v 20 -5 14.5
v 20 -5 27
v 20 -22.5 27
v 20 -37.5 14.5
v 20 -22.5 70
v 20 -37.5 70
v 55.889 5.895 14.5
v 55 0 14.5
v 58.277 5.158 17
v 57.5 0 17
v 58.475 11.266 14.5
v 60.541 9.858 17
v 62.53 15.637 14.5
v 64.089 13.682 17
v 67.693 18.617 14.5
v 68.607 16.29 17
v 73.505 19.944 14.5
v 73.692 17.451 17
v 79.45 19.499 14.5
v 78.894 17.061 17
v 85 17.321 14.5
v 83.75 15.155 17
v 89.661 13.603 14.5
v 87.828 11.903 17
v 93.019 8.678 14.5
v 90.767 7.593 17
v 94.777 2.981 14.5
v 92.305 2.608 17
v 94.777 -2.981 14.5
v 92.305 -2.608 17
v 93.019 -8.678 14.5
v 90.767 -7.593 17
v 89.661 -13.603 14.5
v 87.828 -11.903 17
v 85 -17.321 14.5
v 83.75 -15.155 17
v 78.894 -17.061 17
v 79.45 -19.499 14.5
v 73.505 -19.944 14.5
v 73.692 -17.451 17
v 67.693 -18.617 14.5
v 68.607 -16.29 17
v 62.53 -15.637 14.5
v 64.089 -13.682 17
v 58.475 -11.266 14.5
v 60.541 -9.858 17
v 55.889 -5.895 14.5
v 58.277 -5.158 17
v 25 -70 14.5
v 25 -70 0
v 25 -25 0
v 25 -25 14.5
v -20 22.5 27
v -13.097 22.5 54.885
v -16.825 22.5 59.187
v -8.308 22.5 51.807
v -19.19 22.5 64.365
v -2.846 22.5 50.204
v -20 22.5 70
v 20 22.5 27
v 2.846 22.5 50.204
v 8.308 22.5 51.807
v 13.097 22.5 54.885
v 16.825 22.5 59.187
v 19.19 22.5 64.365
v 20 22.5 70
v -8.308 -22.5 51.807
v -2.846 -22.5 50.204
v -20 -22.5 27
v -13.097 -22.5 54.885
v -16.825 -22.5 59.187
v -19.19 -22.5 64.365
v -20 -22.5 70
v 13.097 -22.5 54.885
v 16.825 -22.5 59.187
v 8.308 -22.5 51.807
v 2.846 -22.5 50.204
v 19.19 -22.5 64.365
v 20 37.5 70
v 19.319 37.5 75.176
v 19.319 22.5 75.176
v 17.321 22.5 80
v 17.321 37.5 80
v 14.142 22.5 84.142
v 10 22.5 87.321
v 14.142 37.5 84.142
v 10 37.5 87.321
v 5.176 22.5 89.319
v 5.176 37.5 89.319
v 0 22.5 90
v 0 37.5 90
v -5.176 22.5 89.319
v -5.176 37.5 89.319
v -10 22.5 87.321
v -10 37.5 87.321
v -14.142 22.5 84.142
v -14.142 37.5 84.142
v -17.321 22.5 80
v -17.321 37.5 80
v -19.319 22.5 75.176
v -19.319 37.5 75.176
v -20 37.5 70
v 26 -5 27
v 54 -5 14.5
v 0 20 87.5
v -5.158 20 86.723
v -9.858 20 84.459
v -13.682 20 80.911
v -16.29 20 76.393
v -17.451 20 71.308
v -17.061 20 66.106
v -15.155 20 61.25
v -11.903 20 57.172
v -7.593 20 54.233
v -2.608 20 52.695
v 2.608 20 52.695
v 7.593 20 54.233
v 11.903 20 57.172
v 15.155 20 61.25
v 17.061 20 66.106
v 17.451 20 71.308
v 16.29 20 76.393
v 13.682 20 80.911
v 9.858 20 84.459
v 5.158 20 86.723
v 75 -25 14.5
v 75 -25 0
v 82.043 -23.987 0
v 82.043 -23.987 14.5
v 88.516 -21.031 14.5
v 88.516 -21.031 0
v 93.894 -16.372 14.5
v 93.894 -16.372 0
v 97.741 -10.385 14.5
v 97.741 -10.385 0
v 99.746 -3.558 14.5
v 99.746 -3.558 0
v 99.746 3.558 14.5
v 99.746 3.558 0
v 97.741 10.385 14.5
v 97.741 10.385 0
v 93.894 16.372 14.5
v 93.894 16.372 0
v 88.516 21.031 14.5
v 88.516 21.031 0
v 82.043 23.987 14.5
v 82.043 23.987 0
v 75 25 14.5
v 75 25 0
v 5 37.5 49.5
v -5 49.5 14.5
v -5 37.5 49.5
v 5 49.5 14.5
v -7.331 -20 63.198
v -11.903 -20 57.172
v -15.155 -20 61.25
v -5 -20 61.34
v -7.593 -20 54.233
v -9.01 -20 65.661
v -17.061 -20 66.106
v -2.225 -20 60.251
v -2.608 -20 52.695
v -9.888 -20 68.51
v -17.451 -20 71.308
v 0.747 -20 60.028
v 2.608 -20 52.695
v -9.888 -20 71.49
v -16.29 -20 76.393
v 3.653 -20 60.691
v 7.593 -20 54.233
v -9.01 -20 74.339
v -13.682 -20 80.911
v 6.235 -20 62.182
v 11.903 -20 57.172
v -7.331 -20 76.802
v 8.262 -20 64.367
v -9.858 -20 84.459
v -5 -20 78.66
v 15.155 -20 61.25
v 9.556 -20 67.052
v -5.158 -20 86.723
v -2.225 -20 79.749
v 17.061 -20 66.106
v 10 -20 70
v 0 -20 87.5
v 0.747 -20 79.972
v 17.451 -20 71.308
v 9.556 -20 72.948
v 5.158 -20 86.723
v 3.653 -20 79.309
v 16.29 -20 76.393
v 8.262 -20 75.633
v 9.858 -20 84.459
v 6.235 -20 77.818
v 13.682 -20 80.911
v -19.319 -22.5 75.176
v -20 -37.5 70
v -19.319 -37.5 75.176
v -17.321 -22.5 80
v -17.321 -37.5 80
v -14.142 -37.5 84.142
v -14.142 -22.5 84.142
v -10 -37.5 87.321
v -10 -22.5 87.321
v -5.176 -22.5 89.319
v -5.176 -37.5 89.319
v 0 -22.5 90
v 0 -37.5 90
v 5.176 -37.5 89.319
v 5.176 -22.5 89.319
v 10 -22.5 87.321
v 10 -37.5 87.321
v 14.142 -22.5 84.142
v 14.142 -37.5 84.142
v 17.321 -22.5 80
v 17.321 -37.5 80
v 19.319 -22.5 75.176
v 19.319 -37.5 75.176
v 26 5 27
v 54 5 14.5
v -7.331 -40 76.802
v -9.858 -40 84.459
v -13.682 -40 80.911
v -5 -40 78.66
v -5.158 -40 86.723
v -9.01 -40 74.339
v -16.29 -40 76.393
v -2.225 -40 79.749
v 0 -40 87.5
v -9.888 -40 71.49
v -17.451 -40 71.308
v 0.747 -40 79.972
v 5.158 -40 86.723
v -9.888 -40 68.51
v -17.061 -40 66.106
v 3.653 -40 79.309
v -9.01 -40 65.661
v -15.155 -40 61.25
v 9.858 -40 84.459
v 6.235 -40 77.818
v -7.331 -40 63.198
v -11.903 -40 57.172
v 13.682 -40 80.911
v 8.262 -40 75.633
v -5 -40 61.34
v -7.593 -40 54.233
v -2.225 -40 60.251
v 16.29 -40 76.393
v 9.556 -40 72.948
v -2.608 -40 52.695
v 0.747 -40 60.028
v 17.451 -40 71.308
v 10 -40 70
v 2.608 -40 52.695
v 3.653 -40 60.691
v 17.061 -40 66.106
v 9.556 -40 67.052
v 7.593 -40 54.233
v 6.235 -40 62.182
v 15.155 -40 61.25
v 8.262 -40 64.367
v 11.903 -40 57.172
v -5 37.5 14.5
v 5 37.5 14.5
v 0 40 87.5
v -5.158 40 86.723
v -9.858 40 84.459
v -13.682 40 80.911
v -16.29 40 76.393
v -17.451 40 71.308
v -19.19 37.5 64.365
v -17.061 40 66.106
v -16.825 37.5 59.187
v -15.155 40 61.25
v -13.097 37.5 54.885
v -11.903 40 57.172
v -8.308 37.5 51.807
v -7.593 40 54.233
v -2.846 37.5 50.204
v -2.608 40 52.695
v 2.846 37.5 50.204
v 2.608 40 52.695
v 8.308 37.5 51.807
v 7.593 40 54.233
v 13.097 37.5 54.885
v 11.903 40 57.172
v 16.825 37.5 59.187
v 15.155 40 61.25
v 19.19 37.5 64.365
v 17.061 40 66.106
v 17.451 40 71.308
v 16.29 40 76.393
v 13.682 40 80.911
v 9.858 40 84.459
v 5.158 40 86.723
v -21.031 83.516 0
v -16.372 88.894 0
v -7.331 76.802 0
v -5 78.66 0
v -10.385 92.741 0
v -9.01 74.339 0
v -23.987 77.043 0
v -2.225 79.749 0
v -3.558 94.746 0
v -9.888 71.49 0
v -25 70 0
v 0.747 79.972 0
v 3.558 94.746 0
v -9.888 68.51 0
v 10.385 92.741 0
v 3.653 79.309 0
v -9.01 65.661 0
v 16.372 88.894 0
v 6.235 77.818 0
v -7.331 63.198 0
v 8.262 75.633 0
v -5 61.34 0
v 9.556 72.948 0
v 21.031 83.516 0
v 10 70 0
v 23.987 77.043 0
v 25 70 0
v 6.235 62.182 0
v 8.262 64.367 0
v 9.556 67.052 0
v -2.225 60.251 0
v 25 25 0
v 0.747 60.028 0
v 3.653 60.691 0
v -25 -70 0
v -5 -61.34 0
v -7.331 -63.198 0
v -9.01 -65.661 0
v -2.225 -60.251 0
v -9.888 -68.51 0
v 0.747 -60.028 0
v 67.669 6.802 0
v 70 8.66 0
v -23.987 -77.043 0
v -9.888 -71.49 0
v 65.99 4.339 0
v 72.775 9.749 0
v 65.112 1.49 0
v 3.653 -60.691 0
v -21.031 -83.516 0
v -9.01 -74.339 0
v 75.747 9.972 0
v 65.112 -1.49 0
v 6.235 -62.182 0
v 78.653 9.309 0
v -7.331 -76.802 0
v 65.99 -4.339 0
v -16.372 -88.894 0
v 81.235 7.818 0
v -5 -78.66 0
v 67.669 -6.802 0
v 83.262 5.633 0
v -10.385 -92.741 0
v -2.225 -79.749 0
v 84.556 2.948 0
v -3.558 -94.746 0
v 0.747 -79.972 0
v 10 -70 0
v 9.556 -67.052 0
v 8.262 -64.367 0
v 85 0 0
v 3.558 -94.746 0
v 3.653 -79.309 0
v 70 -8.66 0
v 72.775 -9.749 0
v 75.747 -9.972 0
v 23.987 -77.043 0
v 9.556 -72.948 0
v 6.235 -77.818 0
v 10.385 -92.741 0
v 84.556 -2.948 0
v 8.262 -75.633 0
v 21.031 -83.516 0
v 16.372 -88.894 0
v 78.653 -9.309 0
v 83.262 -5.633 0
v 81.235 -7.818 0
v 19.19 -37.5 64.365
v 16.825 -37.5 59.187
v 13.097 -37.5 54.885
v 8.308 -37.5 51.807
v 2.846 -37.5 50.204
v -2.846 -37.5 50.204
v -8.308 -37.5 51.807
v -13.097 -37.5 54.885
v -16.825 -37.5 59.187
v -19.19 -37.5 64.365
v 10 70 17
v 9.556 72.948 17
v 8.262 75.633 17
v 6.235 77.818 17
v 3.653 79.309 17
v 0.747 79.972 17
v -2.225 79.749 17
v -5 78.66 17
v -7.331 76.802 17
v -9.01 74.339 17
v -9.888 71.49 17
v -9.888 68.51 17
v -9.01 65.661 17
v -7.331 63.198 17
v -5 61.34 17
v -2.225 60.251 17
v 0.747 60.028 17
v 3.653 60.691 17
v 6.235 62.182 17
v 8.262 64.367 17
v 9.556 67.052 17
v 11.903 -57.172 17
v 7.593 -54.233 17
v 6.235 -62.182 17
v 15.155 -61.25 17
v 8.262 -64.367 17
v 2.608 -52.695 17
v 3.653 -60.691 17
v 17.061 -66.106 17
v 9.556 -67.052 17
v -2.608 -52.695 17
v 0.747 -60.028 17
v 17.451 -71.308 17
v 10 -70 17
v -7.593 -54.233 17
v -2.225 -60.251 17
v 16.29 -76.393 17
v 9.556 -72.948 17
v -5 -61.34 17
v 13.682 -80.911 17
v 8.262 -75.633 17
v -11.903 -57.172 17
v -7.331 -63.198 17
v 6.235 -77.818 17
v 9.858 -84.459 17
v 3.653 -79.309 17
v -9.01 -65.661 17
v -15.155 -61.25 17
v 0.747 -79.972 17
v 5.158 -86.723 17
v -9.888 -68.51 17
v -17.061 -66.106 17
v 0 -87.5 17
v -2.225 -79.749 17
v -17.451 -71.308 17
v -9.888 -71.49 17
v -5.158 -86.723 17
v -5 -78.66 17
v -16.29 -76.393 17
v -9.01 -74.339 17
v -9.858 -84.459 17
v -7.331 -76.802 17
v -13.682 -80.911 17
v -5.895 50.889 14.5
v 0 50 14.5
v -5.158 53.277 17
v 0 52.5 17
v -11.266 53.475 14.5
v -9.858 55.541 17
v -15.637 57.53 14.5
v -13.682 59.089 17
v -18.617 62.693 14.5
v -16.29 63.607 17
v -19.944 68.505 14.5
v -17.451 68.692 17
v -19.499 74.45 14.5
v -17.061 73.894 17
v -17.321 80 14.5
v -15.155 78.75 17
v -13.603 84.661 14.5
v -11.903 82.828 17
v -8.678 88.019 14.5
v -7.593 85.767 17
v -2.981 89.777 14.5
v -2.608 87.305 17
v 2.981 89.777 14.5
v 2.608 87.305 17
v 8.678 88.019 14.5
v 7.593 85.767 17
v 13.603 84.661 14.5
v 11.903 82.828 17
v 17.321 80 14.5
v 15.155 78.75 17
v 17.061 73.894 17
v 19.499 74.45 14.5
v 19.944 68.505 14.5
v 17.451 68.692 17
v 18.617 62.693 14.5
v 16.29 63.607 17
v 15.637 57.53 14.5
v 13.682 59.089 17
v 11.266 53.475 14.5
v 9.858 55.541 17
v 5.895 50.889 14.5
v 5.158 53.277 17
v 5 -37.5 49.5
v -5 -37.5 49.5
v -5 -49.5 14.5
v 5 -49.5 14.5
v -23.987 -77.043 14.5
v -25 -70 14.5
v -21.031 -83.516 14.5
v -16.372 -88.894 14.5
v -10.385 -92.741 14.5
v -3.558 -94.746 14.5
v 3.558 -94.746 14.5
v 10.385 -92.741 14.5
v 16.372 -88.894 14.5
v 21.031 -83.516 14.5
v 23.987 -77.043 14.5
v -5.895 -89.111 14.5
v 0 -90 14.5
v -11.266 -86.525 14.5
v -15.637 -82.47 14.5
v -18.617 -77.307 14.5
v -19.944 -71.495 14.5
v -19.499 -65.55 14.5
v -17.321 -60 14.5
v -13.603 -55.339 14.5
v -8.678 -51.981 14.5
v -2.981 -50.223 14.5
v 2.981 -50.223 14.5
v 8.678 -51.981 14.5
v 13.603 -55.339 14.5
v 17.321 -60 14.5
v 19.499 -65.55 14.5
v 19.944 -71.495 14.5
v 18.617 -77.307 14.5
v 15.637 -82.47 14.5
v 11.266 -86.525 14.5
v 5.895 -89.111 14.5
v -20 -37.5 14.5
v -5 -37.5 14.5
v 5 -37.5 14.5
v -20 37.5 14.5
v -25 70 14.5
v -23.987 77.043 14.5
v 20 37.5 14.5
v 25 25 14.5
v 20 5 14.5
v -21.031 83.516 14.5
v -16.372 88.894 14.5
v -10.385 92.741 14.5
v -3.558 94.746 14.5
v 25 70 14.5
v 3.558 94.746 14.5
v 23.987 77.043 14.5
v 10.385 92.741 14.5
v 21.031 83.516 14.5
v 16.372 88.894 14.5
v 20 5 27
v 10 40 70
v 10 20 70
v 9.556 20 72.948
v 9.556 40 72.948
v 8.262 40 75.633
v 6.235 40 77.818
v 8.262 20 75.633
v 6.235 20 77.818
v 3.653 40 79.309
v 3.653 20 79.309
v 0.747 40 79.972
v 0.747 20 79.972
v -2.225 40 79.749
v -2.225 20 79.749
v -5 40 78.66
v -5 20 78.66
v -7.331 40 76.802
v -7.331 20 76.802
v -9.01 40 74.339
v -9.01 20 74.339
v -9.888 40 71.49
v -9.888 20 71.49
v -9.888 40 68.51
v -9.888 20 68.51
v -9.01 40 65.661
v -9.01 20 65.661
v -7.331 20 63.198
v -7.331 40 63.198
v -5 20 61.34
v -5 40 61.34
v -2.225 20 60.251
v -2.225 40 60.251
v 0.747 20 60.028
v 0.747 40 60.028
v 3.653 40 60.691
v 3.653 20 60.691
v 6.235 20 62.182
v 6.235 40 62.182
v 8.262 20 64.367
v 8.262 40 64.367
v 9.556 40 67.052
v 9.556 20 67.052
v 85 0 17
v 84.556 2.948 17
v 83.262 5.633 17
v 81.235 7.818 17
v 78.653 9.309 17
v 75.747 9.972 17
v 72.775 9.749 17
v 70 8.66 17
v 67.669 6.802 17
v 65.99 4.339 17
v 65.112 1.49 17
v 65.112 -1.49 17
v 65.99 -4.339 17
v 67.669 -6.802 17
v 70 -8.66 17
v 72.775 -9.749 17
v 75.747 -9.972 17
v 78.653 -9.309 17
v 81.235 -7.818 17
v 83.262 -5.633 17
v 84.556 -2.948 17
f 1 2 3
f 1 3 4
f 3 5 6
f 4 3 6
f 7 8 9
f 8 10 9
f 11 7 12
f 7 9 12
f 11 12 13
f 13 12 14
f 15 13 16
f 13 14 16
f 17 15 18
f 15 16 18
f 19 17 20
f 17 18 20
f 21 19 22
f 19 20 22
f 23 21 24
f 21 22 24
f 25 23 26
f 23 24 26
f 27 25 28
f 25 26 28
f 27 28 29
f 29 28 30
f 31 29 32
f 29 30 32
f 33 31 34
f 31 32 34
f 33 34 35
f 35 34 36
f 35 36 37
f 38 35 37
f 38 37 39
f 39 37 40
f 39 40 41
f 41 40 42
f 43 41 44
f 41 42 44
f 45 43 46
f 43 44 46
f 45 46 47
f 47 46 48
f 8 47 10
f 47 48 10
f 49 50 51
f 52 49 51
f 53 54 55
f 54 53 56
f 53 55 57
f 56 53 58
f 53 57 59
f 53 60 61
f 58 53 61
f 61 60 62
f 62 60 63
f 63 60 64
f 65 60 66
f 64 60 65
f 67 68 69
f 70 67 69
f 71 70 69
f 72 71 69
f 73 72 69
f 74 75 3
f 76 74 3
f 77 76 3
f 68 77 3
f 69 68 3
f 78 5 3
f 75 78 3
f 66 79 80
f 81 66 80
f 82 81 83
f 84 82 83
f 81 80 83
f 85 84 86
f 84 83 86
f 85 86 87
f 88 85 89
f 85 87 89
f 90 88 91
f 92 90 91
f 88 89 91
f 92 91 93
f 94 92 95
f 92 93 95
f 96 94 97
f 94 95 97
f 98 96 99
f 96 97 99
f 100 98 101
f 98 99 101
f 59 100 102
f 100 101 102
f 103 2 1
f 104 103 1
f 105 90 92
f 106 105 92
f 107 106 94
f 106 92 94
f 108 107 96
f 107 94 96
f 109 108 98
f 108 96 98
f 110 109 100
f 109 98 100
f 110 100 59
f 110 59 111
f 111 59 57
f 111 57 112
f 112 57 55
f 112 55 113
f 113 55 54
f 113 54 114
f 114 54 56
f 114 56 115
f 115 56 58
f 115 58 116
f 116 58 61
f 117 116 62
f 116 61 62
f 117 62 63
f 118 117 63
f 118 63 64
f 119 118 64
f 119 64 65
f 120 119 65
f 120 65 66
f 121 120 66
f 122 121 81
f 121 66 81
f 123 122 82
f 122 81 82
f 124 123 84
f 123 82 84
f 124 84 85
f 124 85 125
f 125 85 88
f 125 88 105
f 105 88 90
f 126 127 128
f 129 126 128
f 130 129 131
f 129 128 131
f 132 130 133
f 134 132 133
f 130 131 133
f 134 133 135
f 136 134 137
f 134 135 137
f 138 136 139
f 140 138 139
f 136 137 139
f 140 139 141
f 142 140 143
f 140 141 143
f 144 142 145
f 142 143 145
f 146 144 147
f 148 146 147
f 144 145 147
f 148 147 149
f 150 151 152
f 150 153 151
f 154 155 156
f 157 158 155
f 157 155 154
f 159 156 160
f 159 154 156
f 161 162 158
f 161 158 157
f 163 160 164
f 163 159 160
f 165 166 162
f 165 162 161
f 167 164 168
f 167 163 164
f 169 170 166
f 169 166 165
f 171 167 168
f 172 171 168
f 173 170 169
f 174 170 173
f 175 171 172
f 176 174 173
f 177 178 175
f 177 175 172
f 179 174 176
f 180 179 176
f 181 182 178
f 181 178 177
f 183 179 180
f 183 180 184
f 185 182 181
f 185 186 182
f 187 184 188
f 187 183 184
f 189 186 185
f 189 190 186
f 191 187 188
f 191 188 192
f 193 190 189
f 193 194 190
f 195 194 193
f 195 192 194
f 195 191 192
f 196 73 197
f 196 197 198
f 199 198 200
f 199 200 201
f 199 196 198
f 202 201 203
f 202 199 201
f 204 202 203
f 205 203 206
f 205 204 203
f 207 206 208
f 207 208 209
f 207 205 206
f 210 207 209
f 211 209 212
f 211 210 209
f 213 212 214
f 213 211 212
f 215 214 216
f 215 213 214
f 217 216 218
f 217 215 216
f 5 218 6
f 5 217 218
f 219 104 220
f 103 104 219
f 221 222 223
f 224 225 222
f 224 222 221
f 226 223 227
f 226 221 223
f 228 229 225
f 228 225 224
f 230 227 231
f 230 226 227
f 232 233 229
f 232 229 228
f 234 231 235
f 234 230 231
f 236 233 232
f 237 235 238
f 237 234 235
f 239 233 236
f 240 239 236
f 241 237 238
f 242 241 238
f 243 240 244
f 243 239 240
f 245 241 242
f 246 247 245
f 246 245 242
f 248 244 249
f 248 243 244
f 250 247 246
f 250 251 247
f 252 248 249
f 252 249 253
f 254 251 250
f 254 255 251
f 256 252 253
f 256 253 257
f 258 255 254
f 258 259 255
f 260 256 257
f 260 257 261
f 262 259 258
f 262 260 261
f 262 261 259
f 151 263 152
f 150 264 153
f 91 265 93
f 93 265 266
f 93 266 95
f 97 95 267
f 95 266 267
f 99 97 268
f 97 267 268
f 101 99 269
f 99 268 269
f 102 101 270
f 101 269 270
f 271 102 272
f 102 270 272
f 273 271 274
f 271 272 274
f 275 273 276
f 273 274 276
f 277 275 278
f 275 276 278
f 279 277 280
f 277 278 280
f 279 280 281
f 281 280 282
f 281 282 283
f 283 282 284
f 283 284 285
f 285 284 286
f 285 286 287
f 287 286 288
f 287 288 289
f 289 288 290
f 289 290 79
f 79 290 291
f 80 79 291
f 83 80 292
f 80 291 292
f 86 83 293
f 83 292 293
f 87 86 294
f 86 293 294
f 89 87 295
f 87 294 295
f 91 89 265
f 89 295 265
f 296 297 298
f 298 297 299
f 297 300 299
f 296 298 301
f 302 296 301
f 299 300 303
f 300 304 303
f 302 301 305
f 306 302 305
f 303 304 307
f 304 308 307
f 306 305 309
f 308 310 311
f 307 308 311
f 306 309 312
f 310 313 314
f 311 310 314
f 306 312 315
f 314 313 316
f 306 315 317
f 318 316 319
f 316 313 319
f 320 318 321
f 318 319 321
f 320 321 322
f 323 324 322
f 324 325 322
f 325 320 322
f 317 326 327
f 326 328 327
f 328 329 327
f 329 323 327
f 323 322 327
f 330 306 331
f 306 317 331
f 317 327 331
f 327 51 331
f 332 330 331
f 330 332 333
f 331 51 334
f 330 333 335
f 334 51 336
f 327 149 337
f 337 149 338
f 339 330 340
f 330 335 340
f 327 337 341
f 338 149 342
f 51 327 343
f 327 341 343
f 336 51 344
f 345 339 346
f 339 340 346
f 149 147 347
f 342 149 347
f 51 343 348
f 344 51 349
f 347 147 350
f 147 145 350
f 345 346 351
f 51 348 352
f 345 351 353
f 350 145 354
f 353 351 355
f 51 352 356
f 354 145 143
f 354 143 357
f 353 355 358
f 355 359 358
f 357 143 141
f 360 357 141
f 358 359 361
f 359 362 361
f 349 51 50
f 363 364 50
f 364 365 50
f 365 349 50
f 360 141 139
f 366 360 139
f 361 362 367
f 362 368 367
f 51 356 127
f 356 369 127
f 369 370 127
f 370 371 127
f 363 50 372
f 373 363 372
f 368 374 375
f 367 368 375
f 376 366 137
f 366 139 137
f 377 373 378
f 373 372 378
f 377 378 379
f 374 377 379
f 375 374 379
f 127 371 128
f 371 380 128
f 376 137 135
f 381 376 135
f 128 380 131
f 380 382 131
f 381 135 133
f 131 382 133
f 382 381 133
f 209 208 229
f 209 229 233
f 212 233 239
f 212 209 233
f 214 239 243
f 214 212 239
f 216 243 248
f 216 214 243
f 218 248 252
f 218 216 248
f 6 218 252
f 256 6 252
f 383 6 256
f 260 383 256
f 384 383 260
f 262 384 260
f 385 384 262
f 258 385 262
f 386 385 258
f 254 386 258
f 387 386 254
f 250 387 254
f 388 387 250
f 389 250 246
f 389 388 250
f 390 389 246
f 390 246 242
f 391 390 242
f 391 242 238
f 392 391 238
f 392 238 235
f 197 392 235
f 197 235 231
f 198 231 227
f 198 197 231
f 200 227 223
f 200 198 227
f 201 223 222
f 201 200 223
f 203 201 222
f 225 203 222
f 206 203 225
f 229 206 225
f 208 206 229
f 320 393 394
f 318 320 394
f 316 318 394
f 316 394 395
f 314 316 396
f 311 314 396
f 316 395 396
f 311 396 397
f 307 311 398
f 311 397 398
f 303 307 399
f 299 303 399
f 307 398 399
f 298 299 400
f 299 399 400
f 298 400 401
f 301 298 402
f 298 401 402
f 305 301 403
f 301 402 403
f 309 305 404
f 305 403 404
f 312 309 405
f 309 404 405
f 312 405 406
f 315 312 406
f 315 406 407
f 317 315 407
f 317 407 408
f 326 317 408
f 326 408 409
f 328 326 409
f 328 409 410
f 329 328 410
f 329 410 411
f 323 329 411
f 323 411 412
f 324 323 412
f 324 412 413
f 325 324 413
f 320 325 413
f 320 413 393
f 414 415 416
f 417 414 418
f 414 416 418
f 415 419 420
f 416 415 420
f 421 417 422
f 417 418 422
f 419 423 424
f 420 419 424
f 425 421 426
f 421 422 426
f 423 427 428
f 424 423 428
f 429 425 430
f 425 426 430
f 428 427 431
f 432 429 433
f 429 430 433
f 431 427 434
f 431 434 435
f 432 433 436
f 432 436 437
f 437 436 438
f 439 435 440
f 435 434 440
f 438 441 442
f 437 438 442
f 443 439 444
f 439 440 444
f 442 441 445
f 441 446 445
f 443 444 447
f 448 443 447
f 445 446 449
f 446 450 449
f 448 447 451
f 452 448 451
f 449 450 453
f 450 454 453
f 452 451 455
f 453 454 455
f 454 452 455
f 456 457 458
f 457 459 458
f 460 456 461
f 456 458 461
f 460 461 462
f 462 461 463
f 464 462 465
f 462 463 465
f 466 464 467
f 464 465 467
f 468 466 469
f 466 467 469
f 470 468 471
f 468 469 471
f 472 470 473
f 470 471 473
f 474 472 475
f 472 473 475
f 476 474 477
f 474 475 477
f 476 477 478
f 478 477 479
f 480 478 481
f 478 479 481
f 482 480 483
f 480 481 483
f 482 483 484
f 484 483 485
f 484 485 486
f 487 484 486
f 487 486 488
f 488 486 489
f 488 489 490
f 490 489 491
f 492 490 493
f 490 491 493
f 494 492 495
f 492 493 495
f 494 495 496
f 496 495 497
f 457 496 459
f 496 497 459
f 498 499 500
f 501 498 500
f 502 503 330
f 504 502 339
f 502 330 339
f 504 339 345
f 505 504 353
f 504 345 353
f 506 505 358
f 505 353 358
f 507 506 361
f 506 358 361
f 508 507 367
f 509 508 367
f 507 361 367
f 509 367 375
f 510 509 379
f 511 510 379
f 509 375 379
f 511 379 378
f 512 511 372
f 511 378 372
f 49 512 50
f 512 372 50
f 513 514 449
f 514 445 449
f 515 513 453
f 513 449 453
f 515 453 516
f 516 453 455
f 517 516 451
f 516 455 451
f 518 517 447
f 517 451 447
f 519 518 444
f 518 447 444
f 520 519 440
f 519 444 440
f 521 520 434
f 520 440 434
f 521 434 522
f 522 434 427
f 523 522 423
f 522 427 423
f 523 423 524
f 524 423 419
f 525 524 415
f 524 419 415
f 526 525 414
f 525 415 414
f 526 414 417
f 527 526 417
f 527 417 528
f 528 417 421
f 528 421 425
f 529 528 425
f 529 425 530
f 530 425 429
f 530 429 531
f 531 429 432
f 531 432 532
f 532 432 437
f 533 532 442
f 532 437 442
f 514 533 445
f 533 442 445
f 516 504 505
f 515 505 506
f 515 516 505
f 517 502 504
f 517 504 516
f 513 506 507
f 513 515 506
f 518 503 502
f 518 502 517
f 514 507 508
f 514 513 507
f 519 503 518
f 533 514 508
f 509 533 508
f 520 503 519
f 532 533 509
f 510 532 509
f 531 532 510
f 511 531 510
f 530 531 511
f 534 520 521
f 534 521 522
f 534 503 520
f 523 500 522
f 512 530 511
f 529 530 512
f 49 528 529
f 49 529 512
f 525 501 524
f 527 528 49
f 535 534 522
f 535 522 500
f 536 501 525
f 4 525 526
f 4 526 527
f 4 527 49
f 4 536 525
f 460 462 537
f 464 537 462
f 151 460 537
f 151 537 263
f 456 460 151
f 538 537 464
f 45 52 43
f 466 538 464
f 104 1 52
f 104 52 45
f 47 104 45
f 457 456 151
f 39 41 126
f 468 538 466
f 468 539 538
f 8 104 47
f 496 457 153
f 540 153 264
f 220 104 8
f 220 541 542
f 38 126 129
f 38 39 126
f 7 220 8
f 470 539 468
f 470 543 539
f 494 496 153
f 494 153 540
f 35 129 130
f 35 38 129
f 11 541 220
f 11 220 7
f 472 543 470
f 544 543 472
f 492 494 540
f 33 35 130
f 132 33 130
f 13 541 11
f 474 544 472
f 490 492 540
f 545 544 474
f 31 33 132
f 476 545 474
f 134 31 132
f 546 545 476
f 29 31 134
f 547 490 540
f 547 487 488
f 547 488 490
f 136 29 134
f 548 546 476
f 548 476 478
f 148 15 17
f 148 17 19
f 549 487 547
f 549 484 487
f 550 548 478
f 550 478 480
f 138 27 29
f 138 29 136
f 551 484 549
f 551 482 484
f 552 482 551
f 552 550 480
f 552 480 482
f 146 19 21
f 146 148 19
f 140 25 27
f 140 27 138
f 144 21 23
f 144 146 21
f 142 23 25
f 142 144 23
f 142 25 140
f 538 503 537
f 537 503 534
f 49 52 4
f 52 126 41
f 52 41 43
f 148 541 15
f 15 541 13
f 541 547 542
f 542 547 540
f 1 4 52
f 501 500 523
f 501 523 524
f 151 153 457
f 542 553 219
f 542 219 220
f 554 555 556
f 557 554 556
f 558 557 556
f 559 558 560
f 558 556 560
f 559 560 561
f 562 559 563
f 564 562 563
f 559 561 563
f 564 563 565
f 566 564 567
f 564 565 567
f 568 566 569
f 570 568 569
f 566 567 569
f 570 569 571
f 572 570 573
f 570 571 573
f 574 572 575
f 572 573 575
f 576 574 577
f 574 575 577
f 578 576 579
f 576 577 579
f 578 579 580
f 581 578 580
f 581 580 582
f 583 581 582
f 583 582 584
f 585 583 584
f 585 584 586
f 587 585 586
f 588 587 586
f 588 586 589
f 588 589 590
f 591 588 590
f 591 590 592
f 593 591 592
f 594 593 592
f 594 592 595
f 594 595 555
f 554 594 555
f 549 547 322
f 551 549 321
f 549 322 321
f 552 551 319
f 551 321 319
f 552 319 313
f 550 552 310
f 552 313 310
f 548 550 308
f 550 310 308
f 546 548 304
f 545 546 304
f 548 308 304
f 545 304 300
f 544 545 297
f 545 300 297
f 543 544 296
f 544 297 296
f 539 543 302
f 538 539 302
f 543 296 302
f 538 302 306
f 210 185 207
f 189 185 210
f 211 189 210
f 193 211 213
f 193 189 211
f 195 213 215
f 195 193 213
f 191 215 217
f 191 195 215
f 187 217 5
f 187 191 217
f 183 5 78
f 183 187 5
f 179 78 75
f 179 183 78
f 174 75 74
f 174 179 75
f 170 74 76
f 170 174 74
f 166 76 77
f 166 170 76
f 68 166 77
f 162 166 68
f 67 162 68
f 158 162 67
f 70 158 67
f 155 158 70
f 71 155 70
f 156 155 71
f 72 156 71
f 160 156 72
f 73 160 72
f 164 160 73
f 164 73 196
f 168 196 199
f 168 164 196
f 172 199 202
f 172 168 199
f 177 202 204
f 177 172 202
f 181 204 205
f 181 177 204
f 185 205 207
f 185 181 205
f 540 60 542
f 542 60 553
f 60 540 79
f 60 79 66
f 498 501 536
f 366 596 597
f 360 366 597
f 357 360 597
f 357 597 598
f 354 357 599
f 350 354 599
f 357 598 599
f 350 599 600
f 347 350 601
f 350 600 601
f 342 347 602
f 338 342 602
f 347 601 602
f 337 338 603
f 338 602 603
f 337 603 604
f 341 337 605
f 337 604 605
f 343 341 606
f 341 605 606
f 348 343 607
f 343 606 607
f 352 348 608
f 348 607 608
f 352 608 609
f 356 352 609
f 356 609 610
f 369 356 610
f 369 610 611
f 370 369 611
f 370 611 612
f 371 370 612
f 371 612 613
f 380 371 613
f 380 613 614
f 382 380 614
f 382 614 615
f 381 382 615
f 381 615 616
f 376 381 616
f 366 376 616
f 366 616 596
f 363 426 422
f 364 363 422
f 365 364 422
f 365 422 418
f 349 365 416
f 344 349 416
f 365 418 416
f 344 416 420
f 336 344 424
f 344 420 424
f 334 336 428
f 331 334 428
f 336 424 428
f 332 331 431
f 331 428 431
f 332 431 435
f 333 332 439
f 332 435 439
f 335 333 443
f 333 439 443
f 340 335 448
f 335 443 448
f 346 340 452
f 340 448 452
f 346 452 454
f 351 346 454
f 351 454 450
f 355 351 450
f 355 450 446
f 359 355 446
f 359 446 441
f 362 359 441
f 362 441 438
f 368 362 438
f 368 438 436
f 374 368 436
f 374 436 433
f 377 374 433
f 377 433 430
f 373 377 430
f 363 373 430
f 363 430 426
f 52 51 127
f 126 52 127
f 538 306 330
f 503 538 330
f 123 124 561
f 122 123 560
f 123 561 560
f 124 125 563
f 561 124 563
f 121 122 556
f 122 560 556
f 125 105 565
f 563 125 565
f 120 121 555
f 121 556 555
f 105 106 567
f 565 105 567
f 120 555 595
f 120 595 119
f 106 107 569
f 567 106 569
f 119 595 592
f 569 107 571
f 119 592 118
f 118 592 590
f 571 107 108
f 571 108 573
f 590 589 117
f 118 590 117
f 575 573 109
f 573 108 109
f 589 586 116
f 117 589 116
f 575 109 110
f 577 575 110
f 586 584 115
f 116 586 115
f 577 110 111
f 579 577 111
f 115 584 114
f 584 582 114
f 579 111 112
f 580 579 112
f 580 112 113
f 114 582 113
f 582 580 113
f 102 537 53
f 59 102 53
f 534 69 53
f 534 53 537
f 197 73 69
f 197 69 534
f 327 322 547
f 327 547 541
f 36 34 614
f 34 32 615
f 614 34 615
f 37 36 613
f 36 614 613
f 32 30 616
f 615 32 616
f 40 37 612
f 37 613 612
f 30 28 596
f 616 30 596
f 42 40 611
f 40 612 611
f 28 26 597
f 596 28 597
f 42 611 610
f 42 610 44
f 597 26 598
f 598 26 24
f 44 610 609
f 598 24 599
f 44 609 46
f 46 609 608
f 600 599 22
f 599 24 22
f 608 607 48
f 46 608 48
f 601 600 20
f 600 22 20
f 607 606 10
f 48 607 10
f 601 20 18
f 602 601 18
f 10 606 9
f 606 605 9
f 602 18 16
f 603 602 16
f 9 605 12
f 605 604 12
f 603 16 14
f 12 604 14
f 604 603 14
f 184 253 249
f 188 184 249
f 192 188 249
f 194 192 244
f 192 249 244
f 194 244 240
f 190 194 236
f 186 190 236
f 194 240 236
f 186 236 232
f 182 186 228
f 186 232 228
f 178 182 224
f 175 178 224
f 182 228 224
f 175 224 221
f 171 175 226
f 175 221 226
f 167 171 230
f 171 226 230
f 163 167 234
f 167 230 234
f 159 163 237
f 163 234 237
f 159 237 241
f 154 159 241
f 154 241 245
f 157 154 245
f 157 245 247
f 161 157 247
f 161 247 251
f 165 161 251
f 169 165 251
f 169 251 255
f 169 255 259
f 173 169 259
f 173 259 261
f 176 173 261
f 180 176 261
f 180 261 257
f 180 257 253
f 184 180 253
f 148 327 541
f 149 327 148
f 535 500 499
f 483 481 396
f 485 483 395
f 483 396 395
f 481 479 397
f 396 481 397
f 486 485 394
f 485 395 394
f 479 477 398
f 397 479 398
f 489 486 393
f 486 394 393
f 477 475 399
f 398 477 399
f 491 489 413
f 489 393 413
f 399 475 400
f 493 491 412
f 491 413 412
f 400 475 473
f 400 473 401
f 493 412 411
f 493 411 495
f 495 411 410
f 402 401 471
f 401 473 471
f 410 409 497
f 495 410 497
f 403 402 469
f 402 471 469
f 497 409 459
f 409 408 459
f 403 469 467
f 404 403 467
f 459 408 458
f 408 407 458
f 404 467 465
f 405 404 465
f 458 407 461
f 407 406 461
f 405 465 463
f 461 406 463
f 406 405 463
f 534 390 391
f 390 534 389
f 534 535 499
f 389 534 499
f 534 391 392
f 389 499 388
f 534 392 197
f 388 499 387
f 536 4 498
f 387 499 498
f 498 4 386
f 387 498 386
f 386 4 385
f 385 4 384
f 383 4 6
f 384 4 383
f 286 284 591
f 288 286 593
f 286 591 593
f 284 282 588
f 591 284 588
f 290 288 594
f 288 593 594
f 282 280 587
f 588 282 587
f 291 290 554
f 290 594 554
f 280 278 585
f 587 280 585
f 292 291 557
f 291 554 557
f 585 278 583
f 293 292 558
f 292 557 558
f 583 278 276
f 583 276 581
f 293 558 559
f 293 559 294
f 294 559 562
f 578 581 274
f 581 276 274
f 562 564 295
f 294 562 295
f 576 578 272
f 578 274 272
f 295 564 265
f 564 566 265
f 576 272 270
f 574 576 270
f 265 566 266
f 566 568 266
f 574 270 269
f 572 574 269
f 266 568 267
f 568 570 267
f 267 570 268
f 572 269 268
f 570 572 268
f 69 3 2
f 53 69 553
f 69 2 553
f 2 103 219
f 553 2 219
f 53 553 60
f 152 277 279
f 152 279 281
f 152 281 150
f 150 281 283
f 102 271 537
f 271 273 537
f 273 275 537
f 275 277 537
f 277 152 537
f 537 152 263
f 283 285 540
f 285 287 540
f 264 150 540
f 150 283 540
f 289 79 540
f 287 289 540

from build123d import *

# Parameters (mm, degrees)
PAD001_DEPTH    = 20
PAD002_DEPTH    = 5
PAD003_DEPTH    = 5
PAD_DEPTH       = 14.5
SKETCH009_R     = 10
POCKET_DEPTH    = 135.000977
SKETCH010_R     = 10
POCKET001_DEPTH = 17.001


with BuildPart() as revolution002:
    # Sketch006 → Revolution002 (revolve)
    with BuildSketch(Plane.YZ):
        Polygon((-70, 14.5), (-90, 14.5), (-87.5, 17), (-70, 17), align=None)
    revolve(axis=Axis((0, -70, 14.5), (0, 0, -1)))


with BuildPart() as revolution003:
    # Sketch007 → Revolution003 (revolve)
    with BuildSketch(Plane.YZ):
        Polygon((70, 14.5), (50, 14.5), (52.5, 17), (70, 17), align=None)
    revolve(axis=Axis((0, 70, 14.5), (0, 0, -1)))


with BuildPart() as revolution004:
    # Sketch008 → Revolution004 (revolve)
    with BuildSketch(Plane.XZ):
        Polygon((75, 14.5), (55, 14.5), (57.5, 17), (75, 17), align=None)
    revolve(axis=Axis((75, 0, 14.5), (0, 0, -1)))


with BuildPart() as pad001:
    # Sketch001 → Pad001 (new body, symmetric)
    with BuildSketch(Plane.YZ):
        Polygon((-37.5, 0), (-37.5, 70), (-22.5, 70), (-22.5, 27), (22.5, 27), (22.5, 70), (37.5, 70), (37.5, 0), align=None)
    extrude(amount=PAD001_DEPTH, both=True)


with BuildPart() as pad002:
    # Sketch002 → Pad002 (new body, symmetric)
    with BuildSketch(Plane.YZ):
        Polygon((-49.5, 14.5), (-37.5, 14.5), (-37.5, 49.5), align=None)
        Polygon((37.5, 49.5), (37.5, 14.5), (49.5, 14.5), align=None)
    extrude(amount=PAD002_DEPTH, both=True)


with BuildPart() as pad003:
    # Sketch003 → Pad003 (new body, symmetric)
    with BuildSketch(Plane.XZ):
        Polygon((20, 27), (20, 14.5), (54, 14.5), (26, 27), align=None)
    extrude(amount=PAD003_DEPTH, both=True)


with BuildPart() as revolution:
    # Sketch004 → Revolution (revolve)
    with BuildSketch(Plane.YZ):
        Polygon((-40, 87.5), (-37.5, 90), (-22.5, 90), (-20, 87.5), (-20, 70), (-40, 70), align=None)
    revolve(axis=Axis((0, -20, 70), (0, 1, 0)))


with BuildPart() as revolution001:
    # Sketch005 → Revolution001 (revolve)
    with BuildSketch(Plane.YZ):
        Polygon((20, 87.5), (22.5, 90), (37.5, 90), (40, 87.5), (40, 70), (20, 70), align=None)
    revolve(axis=Axis((0, 20, 70), (0, -1, 0)))


with BuildPart() as pocket001:
    # Sketch → Pad (new body)
    with BuildSketch(Plane.XY):
        with BuildLine():
            Line((-25, 69.999978), (-25, -70.000022))
            ThreePointArc((-25, -70.000022), (2e-05, -95.000023), (25, -69.999981))
            Line((25, -69.999981), (25, -25))
            Line((25, -25), (74.999999, -25))
            ThreePointArc((74.999999, -25), (100, 0), (75, 25))
            Line((25, 25), (75, 25))
            Line((25, 69.999981), (25, 25))
            ThreePointArc((25, 69.999981), (-2e-06, 94.999977), (-25, 69.999978))
        make_face()
    extrude(amount=PAD_DEPTH)

    # Fusion: union Revolution002, Revolution003, Revolution004, Pad001, Pad002, Pad003, Revolution, Revolution001
    add(revolution002.part)
    add(revolution003.part)
    add(revolution004.part)
    add(pad001.part)
    add(pad002.part)
    add(pad003.part)
    add(revolution.part)
    add(revolution001.part)

    # Sketch009 (on Face42 of Fusion) → Pocket (cut, through all)
    with BuildSketch(Plane.XZ.offset(40)):
        with Locations((0, 70)):
            Circle(SKETCH009_R)
    extrude(amount=-POCKET_DEPTH, mode=Mode.SUBTRACT)

    # Sketch010 (on Face42 of Pocket) → Pocket001 (cut, through all)
    with BuildSketch(Plane.XY.offset(17)):
        with Locations((0, -70)):
            Circle(SKETCH010_R)
        with Locations((75, 0)):
            Circle(SKETCH010_R)
        with Locations((0, 70)):
            Circle(SKETCH010_R)
    extrude(amount=-POCKET001_DEPTH, mode=Mode.SUBTRACT)


solid = pocket001.part
